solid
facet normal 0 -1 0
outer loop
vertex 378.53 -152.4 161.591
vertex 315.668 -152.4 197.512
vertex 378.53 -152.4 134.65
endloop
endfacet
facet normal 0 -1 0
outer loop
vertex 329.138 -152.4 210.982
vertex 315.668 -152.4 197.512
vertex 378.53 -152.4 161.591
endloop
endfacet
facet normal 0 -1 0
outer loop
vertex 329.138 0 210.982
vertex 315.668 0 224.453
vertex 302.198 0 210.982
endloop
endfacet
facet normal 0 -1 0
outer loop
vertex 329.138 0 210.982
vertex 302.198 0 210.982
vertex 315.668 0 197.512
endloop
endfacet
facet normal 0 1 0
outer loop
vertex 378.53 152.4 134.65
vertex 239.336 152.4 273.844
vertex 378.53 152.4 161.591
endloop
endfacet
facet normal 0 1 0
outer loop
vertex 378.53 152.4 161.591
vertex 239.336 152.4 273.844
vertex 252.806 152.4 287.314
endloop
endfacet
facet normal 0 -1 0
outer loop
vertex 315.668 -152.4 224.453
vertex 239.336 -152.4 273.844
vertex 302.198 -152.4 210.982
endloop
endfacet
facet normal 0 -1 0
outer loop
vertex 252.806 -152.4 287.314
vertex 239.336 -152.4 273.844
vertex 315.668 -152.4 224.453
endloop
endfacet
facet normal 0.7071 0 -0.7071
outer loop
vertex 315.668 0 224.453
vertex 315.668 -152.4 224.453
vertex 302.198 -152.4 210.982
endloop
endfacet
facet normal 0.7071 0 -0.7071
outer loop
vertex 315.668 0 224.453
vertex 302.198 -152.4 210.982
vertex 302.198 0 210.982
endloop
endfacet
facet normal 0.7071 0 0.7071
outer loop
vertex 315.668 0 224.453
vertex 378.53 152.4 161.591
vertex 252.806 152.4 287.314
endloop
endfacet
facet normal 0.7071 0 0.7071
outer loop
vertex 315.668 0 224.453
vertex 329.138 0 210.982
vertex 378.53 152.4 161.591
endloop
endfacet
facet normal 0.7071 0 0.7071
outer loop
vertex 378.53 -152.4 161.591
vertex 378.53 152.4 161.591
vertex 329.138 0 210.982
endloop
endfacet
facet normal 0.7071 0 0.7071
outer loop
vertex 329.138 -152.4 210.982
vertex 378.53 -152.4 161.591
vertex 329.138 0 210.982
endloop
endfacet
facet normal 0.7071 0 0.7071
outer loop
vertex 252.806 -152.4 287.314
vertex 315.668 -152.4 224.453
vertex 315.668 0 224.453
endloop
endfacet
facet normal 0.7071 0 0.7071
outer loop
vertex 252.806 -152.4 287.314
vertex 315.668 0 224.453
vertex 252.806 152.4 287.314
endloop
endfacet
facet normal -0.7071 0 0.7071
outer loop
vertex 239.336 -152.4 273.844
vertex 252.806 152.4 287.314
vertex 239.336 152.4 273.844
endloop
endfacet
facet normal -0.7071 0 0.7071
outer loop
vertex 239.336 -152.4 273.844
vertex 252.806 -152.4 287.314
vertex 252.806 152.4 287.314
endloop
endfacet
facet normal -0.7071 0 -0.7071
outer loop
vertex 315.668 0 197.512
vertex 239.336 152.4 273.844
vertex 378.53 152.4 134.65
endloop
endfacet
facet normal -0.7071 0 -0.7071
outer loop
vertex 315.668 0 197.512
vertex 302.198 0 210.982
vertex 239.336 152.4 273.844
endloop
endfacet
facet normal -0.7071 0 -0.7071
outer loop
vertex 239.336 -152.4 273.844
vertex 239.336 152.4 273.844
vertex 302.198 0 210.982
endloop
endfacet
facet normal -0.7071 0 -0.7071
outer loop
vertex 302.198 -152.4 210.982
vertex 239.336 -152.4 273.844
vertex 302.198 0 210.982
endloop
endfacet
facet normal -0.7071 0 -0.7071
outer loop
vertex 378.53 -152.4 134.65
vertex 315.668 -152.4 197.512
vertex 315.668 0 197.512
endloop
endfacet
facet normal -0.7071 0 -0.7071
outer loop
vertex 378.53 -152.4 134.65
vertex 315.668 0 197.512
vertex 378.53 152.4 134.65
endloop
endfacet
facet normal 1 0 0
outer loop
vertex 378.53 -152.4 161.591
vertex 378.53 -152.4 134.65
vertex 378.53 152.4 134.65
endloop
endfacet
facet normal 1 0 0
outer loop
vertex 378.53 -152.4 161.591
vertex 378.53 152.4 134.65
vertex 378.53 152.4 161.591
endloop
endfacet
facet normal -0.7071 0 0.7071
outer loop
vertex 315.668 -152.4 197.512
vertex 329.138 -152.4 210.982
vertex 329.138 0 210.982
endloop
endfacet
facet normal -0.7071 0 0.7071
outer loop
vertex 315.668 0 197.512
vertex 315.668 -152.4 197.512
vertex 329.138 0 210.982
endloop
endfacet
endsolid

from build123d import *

# Parameters (mm, degrees)
F1_DEPTH = 152.4
F2_W     = 19.05
F2_H     = 152.4
F3_DEPTH = 19.05


with BuildPart() as f1:
    # F0 (on Front) → F1 (new body, symmetric)
    with BuildSketch(Plane.XZ):
        Polygon((239.3357296876, 273.8439301559), (378.5296995641, 134.6499602793), (378.5296995641, 161.5907286425), (252.8061138692, 287.3143143375), align=None)
    extrude(amount=F1_DEPTH, both=True)

    # F2 (on face) → F3 (cut)
    with BuildSketch(Plane(origin=(270.0602141033, 0, 270.0602141033), x_dir=(0.7071067812, 0, -0.7071067812), z_dir=(0.7071067812, 0, 0.7071067812))):
        with Locations((74.0240174423, -76.2)):
            Rectangle(F2_W, F2_H)
    extrude(amount=-F3_DEPTH, mode=Mode.SUBTRACT)


solid = f1.part
